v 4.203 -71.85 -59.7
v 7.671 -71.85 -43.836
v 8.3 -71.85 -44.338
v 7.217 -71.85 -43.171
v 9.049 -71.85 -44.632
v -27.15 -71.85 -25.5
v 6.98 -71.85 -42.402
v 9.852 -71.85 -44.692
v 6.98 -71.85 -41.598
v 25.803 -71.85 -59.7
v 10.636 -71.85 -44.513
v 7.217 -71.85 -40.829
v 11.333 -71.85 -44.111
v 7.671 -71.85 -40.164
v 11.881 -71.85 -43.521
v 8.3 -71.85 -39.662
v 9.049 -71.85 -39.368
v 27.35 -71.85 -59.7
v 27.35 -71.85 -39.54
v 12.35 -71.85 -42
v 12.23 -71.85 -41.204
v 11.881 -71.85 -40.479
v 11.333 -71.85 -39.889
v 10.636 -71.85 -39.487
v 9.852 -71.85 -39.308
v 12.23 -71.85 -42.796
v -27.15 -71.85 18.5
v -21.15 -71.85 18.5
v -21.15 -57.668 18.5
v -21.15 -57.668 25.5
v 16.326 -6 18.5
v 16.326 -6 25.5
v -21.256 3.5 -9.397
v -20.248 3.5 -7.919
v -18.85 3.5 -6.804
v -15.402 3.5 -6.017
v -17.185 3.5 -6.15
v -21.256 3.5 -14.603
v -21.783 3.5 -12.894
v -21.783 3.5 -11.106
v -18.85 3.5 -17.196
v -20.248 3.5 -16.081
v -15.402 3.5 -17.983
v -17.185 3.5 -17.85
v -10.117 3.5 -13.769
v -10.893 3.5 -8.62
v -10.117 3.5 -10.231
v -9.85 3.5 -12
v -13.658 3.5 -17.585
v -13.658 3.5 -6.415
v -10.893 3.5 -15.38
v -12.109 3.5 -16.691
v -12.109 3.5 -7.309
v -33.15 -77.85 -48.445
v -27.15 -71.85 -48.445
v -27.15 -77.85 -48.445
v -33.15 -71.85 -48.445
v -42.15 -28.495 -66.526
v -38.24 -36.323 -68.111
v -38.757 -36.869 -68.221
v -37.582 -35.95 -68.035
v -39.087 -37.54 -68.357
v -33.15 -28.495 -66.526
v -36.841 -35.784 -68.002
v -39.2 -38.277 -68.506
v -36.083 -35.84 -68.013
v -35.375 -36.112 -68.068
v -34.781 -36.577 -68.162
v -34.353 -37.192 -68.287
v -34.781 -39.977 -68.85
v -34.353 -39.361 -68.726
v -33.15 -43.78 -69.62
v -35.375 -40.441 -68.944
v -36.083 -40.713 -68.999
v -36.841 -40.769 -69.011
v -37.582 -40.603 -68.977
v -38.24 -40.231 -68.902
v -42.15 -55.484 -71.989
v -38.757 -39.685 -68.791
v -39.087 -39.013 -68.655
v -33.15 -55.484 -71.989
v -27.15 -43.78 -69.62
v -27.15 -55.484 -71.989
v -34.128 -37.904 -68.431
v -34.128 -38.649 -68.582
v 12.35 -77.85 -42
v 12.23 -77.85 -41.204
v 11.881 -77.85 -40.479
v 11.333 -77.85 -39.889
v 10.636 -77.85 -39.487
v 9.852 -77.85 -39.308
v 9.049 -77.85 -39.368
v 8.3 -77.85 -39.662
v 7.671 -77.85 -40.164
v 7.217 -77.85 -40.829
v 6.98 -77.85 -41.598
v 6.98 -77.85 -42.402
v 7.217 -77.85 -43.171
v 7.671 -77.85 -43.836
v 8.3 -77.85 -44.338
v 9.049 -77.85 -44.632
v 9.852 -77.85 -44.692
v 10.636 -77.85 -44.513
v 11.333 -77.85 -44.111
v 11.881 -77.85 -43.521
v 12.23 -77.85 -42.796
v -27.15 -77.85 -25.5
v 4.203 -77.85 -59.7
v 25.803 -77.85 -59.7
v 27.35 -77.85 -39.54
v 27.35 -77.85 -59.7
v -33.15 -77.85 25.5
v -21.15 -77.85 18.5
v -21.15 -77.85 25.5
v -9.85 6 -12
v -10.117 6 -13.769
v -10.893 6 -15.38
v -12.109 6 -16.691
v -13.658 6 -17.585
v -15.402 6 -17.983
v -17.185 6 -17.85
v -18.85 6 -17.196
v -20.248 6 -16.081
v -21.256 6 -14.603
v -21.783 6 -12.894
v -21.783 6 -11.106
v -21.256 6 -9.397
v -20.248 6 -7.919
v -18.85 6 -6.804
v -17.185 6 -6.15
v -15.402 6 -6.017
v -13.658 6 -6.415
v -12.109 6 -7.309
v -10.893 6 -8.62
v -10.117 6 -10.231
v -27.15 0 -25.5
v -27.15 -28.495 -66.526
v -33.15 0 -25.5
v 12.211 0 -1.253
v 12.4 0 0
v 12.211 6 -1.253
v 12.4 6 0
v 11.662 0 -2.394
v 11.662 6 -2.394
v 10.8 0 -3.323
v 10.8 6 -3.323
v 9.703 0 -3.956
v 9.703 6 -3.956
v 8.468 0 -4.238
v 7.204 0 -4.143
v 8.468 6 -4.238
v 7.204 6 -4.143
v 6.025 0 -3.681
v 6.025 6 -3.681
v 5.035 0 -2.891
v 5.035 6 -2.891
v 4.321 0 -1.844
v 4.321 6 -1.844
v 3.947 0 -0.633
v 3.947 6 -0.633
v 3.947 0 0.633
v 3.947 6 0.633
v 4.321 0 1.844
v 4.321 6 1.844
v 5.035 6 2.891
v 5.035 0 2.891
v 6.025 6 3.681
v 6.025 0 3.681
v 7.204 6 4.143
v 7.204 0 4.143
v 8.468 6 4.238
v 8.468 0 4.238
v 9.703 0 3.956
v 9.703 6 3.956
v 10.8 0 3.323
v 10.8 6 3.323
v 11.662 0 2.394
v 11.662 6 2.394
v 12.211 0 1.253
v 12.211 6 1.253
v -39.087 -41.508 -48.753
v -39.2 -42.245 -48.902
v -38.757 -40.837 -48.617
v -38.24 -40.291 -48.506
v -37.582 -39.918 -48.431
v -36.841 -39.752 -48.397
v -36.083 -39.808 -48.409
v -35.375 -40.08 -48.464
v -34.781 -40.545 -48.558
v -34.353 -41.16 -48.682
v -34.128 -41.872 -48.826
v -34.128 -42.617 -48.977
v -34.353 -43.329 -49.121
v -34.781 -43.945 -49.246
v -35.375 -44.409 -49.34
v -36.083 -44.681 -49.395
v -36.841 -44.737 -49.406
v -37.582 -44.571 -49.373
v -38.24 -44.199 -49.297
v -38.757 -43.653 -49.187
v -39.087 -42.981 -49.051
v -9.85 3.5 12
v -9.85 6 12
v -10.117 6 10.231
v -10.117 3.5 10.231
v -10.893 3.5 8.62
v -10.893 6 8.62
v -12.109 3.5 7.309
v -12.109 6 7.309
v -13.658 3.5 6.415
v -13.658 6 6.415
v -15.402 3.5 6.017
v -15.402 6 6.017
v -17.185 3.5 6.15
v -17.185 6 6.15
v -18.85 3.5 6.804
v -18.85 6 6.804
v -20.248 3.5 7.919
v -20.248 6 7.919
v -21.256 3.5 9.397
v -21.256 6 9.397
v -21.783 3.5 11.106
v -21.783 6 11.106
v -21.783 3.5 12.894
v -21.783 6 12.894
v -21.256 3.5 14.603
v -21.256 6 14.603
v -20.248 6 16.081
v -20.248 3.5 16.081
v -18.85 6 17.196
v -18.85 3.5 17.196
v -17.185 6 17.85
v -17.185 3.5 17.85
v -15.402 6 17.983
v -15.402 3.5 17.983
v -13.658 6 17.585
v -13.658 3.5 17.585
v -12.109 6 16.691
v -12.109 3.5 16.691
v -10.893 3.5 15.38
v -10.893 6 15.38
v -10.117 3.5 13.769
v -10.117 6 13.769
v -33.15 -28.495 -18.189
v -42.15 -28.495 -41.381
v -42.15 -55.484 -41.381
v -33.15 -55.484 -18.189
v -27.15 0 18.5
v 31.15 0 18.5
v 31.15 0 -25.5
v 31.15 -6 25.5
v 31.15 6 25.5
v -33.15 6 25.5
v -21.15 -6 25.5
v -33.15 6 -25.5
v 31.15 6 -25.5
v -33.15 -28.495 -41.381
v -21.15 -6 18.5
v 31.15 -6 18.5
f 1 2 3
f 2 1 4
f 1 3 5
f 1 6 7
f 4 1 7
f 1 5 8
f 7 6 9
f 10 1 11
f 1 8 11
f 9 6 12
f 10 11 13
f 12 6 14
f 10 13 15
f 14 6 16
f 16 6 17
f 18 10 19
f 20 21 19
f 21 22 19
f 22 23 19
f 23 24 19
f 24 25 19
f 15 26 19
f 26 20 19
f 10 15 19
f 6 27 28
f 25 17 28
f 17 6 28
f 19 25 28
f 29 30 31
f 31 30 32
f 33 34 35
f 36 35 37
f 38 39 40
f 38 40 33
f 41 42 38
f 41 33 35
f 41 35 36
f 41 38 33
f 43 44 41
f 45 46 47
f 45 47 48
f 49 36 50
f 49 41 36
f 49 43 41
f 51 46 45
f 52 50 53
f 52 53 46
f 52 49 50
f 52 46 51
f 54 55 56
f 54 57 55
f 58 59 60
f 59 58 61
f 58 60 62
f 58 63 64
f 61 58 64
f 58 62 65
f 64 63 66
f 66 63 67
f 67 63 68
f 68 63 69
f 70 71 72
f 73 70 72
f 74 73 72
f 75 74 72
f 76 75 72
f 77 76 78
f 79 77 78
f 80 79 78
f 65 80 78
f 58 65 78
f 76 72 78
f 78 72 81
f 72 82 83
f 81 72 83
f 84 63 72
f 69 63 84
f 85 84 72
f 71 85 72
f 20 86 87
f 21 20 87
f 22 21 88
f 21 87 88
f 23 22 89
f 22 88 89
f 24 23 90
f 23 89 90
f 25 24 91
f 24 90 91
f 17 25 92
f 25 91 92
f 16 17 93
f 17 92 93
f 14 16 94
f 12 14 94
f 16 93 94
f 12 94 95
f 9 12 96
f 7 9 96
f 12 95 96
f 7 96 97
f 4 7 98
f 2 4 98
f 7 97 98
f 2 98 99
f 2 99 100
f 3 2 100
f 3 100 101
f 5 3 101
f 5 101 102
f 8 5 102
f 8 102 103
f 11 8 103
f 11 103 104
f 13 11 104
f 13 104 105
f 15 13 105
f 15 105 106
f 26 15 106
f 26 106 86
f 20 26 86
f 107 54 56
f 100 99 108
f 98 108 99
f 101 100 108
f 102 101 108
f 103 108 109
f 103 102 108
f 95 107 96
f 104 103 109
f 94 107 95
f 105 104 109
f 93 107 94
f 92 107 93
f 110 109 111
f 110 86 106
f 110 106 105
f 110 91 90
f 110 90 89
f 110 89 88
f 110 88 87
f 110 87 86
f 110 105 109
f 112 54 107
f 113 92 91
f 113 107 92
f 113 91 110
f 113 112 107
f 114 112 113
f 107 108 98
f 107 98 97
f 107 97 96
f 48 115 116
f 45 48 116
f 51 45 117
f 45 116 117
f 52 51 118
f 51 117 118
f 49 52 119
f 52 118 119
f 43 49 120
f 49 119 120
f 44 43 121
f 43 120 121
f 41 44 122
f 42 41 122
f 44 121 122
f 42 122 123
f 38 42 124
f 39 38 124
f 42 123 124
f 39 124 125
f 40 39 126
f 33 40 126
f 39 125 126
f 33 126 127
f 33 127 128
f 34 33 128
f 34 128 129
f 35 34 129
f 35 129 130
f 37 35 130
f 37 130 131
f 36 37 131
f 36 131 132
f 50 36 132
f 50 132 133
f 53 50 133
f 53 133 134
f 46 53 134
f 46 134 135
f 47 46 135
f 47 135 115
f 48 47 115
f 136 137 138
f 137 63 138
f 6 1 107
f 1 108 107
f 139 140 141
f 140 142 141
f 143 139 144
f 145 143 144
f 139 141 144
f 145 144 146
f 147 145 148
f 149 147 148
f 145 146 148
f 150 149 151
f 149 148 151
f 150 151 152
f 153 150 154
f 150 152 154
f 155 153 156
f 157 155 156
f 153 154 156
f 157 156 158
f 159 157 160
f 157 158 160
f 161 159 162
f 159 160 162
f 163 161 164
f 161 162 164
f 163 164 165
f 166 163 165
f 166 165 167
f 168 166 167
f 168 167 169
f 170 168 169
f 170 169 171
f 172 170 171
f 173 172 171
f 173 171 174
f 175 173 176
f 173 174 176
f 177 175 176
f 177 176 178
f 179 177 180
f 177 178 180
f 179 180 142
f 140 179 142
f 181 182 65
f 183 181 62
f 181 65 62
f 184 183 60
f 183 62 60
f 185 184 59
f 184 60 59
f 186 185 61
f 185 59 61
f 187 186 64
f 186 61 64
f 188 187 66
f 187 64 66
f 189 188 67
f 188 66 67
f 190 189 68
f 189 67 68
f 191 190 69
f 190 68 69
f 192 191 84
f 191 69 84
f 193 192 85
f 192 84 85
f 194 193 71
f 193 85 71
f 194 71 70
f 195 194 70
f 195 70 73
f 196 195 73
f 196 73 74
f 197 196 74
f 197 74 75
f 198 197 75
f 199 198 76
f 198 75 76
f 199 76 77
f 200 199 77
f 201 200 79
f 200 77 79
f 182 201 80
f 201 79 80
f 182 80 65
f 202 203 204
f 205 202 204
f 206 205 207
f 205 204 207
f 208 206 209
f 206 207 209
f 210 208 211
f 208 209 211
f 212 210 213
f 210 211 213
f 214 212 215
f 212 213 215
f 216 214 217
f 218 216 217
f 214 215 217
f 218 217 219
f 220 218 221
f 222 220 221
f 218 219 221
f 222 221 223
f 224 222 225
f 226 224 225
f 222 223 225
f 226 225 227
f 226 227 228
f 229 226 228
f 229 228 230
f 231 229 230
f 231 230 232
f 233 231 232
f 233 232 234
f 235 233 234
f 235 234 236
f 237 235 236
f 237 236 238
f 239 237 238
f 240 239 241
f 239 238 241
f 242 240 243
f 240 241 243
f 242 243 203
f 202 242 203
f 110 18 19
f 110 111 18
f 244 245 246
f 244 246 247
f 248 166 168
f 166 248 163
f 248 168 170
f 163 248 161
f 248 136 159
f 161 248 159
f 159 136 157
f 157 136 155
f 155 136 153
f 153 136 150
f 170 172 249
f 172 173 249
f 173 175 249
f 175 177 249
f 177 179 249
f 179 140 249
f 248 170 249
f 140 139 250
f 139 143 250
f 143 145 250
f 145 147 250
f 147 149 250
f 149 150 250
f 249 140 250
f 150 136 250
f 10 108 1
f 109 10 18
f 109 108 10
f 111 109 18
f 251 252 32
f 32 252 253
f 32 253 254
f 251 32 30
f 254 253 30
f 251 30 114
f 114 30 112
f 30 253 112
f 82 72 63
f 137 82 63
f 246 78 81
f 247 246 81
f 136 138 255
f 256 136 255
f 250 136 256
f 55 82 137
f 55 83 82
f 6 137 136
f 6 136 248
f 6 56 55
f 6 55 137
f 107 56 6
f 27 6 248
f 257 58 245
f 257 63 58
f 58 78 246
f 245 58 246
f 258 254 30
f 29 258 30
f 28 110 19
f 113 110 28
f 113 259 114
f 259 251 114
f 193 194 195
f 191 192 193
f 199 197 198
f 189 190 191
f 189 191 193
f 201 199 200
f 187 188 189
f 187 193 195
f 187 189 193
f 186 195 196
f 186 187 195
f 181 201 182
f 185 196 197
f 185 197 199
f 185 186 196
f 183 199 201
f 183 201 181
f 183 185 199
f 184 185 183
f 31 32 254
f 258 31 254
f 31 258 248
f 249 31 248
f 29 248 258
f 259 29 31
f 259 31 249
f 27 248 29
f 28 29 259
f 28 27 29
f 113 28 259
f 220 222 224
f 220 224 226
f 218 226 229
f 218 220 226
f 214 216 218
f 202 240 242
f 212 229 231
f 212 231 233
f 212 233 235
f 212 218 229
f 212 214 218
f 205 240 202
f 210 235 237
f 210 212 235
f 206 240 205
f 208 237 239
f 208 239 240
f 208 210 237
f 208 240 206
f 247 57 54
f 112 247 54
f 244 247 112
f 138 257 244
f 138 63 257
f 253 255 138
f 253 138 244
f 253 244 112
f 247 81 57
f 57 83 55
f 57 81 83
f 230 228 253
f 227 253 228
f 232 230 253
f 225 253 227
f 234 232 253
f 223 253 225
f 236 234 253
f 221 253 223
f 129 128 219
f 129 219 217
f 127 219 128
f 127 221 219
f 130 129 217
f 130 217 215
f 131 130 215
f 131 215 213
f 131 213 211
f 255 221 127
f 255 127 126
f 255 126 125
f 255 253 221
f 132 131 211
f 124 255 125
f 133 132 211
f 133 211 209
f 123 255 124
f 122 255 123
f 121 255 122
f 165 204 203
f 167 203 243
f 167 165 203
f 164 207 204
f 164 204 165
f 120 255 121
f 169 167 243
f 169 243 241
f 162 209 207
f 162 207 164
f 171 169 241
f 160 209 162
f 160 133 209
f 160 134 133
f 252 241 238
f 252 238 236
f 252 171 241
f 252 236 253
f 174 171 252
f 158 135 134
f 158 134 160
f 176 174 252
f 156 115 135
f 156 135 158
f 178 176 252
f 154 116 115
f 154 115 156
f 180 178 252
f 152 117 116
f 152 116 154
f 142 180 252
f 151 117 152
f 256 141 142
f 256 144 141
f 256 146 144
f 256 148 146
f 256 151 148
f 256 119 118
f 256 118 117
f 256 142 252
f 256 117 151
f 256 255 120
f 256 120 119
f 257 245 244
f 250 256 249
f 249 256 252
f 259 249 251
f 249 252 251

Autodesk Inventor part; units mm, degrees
ref_plane "YZ Plane" through (0, 0, 0) normal (1, 0, 0) x (0, 1, 0)
ref_plane "XZ Plane" through (0, 0, 0) normal (0, 1, 0) x (-1, 0, 0)
ref_plane "XY Plane" through (0, 0, 0) normal (0, 0, 1) x (1, 0, 0)
sketch "Sketch1" plane through (0, 0, 0) normal (0, 1, 0) x (-1, 0, 0)
  line L0 (0, -25.5) -> (-34.15, -25.5)
  line L1 (-34.15, -25.5) -> (-34.15, 0)
  line L2 (-34.15, 0) -> (-34.15, 25.5)
  line L3 (-34.15, 25.5) -> (0, 25.5)
  line L4 (0, 25.5) -> (34.15, 25.5)
  line L5 (34.15, 25.5) -> (34.15, 0)
  line L6 (34.15, 0) -> (34.15, -25.5)
  line L7 (34.15, -25.5) -> (0, -25.5)
  point P0 (0, 0)
extrude "Extrusion1" add sketch "Sketch1" along normal blind 7
sketch "Sketch3" plane through (-34.15, 0, 25.5) normal (0, 0, 1) x (1, 0, 0)
  line L0 (0, 0) -> (0, -78.85)
  point P0 (34.15, 0)
  dimension "d7" = 78.85
sketch "Sketch4" plane through (-34.15, 0, -25.5) normal (-1, 0, 0) x (0, 0, 1)
  line L0 (51, 0) -> (51, -78.85)
  line L1 (51, -78.85) -> (-39, -78.85)
  line L2 (-39, -78.85) -> (-39, -71.85)
  line L3 (0, 0) -> (-39, -71.85)
  line L4 (0, 0) -> (51, 0)
  point P0 (25.5, 0)
  dimension "d10" = 90
  dimension "d11" = 7
extrude "Extrusion2" add sketch "Sketch4" against normal blind 7
sketch "Sketch6" plane through (0, 7, 0) normal (0, 1, 0) x (1, 0, 0)
  line L0 (34.15, -25.5) -> (34.15, 25.5) projected
  line L1 (34.15, 25.5) -> (34.15, 0)
  line L2 (-34.15, 25.5) -> (-34.15, -25.5) projected
  circle A0 centre (8.15, 0) radius 5
  point P0 (0, 0)
  dimension "d20" = 10
extrude "Extrusion4" cut sketch "Sketch6" against normal blind 10
sketch "Sketch7" plane through (-27.15, 0, -25.5) normal (1, 0, 0) x (0, 0, -1)
  line L0 (-51, -78.85) -> (39, -78.85) projected
  line L1 (-51, -78.85) -> (39, -78.85)
  line L2 (39, -78.85) -> (39, -71.85) projected
  line L3 (39, -78.85) -> (39, -71.85)
  line L4 (39, -71.85) -> (-51, -71.85)
  line L5 (-51, 0) -> (-51, -78.85) projected
  line L6 (-51, -78.85) -> (-51, -71.85)
  point P0 (-25.5, 0)
sketch "Sketch8" plane through (0, 0, 0) normal (0, -1, 0) x (1, 0, 0)
  circle A0 centre (8.15, 0) radius 5 projected
  line L0 (8.15, 18.5) -> (34.15, 18.5)
  line L1 (34.15, 25.5) -> (34.15, -25.5) projected
  line L2 (8.15, 25.5) -> (34.15, 25.5)
  line L3 (8.15, 25.5) -> (-27.15, 25.5)
  line L4 (-27.15, 25.5) -> (-27.15, -25.5) projected
  line L5 (8.15, 18.5) -> (-27.15, 18.5)
  line L6 (34.15, 25.5) -> (34.15, 18.5)
  line L7 (-27.15, 25.5) -> (-27.15, 18.5)
  point P0 (0, 0)
extrude "Extrusion6" add sketch "Sketch7" along normal blind 58.5
extrude "Extrusion7" add sketch "Sketch8" along normal blind 78.75 contours L5 L4 L3 L2 L1 L0
sketch "Sketch9" plane through (31.35, 0, -25.5) normal (1, 0, 0) x (0, 0, -1)
  line L0 (-51, -78.75) -> (-51, 7) projected
  line L1 (-44, 0) -> (-44, -71.85) projected
  line L2 (-51, -78.75) -> (-44, -78.75)
  line L3 (-44, -78.75) -> (-44, -71.85)
  line L4 (-44, -71.85) -> (-51, -71.85)
  line L5 (-51, -71.85) -> (-51, -78.75)
  point P0 (-25.5, 0)
extrude "Extrusion8" cut sketch "Sketch9" along normal blind 10
sketch "Sketch10" plane through (0, 7, 0) normal (0, 1, 0) x (1, 0, 0)
  point P0 (0, 0)
sketch "Boceto11" plane through (-34.15, -78.85, -64.5) normal (0, -1, 0) x (1, 0, 0)
  line L0 (72.0718, 89.9914) -> (72.0718, 37.9883)
  line L1 (72.0718, 37.9883) -> (65.5278, 37.9883)
  line L2 (65.5278, 37.9883) -> (65.5278, 89.9914)
  line L3 (72.0718, 89.9914) -> (72.0718, 92.1751)
  line L4 (72.0718, 92.1751) -> (65.5278, 92.1751)
  line L5 (65.5278, 92.1751) -> (65.5278, 89.9914)
  point P0 (34.15, 64.5)
extrude "Extrusión9" cut sketch "Boceto11" against normal blind 1000
sketch "Boceto18" plane through (-34.15, -78.85, 25.5) normal (0, 0, 1) x (1, 0, 0)
  point P0 (34.15, 78.85)
sketch "Boceto23" plane through (-27.15, 0, -25.5) normal (0, 0.4770514, -0.8788754) x (-1, 0, 0)
  point P0 (-27.15, 12.1648)
sketch "Boceto24" plane through (-27.15, 0, -25.5) normal (0, 0, -1) x (-1, 0, 0)
  line L0 (7, -71.85) -> (7, -78.85) projected
  line L1 (7, -78.35) -> (7, -78.85)
  line L2 (7, -78.85) -> (-58.5, -78.85) projected
  line L3 (-58.5, -78.85) -> (-58.5, -77.85)
  line L4 (-58.5, -71.85) -> (-58.5, -78.85) projected
  line L5 (-58.5, -77.85) -> (6, -77.85)
  line L6 (7, -77.85) -> (7, -78.85)
  line L7 (7, -78.85) -> (-58.8392, -78.85)
  line L8 (-58.5278, 7) -> (7, 7) projected
  line L9 (7, -78.85) -> (7, 7)
  line L10 (7, 7) -> (6, 7)
  line L11 (6, 6) -> (6, -77.85)
  line L12 (-58.5278, -71.85) -> (-58.5278, 7) projected
  line L13 (-58.5278, 7) -> (-58.5278, 6)
  line L14 (-58.5278, 6) -> (6, 6)
  line L15 (7, 0) -> (7, 7) projected
  line L16 (7, 6) -> (7, 7)
  line L17 (7, 7) -> (-58.5278, 7)
  point P0 (-27.15, 0)
  dimension "d65" = 1
  dimension "d66" = 1
  dimension "d67" = 1
extrude "Extrusión19" cut sketch "Boceto24" along normal mid plane 1000
sketch "Boceto25" plane through (31.35, -71.85, -64.5) normal (0, 0, -1) x (-1, 0, 0)
  point P0 (31.35, 71.85)
sketch "Boceto27" plane through (31.3778, 0, -25.5) normal (0, 0, -1) x (-1, 0, 0)
  line L0 (0, -71.85) -> (0, 6) projected
  line L1 (0, 6) -> (0.228, 6)
  line L2 (0, 6) -> (64.5278, 6) projected
  line L3 (0.228, 6) -> (0.228, -77.85)
  line L4 (0.0278, -77.85) -> (64.5278, -77.85) projected
  line L5 (0.0278, -71.85) -> (0.0278, -77.85) projected
  line L6 (0.228, -77.85) -> (0.0278, -77.85)
  line L7 (0.0278, -77.85) -> (0, 6)
  line L8 (0, 6) -> (0, -77.85)
  line L9 (0, -77.85) -> (0.0278, -77.85)
  point P0 (31.3778, 0)
  dimension "d73" = 0.228
extrude "Extrusión21" cut sketch "Boceto27" along normal mid plane 1000
sketch "Boceto28" plane through (-33.15, 0, -25.5) normal (-1, 0, 0) x (0, 0, 1)
  point P0 (25.5, 0)
sketch "Boceto30" plane through (-33.15, 0, -25.5) normal (-1, 0, 0) x (0, 0, 1)
  point P0 (25.5, 0)
sketch "Boceto31" plane through (-33.15, 0, -25.5) normal (-1, 0, 0) x (0, 0, 1)
  circle A0 centre (64.38, -38.5153) radius 2.6
  point P0 (25.5, 0)
  point P1 (64.38, -49.4573)
sketch "Boceto32" plane through (-27.15, -71.85, 18.5) normal (0, 1, 0) x (1, 0, 0)
  circle A0 centre (47, 71.5) radius 5 projected
  circle A1 centre (47, 71.5) radius 5
  line L0 (52, 71.5) -> (58.2998, 71.5)
  line L1 (67, 83) -> (67, -7)
  line L2 (58.2998, -7) -> (-6, -7) projected
  line L3 (67, -7) -> (58.2998, -7)
  line L4 (58.2998, -7) -> (58.2998, 83)
  line L5 (47, 76.5) -> (47, 83)
  line L6 (-6, 83) -> (0, 83) projected
  line L7 (-6, 83) -> (-6, 91.5)
  line L8 (-6, 91.5) -> (67, 91.5)
  line L9 (67, 91.5) -> (67, 83)
  line L10 (-6, 83) -> (58.2998, 83)
  point P0 (27.15, 18.5)
extrude "Extrusión23" add sketch "Boceto32" against normal blind 6 contours L4 L10 L6 L7 L8 L9 L1 L3
sketch "Boceto33" plane through (-33.15, -77.85, 25.5) normal (-1, 0, 0) x (0, 0, 1)
  line L0 (0, 83.85) -> (0, 0) projected
  line L1 (0, 74.4354) -> (10.1255, 74.4354)
  line L2 (10.1255, 74.4354) -> (10.1255, 56.6115)
  line L3 (10.9445, 54.9975) -> (18.0243, 49.8171)
  line L4 (18.8039, 48.5979) -> (20.1084, 42.1205)
  line L5 (0, 11.6181) -> (18.1478, 11.6181)
  line L6 (20.1478, 13.6181) -> (20.1478, 41.7256)
  arc A0 (10.1255, 56.6115) -> (10.9445, 54.9975) centre (12.1255, 56.6115) ccw
  arc A1 (18.8039, 48.5979) -> (18.0243, 49.8171) centre (16.8433, 48.203) ccw
  arc A2 (20.1478, 41.7256) -> (20.1084, 42.1205) centre (18.1478, 41.7256) ccw
  arc A3 (18.1478, 11.6181) -> (20.1478, 13.6181) centre (18.1478, 13.6181) ccw
  point P0 (-25.5, 77.85)
  dimension "d91" = 2
extrude "Extrusión24" add sketch "Boceto33" against normal blind 6
extrude "Extrusión25" cut sketch "Boceto31" against normal blind 6
sketch "Boceto34" plane through (-27.15, -77.85, 25.5) normal (1, 0, 0) x (0, 0, -1)
  line L0 (-18.1478, 11.6181) -> (-21.8775, 11.6181)
  line L1 (-21.8775, 11.6181) -> (-21.8775, 48.067)
  line L2 (-21.8775, 48.067) -> (-10.1255, 56.8358)
  line L3 (-10.1255, 74.4354) -> (-10.1255, 56.6115) projected
  line L4 (-10.1255, 56.8358) -> (-10.1255, 48.9642)
  line L5 (-10.1255, 48.9642) -> (-16.6729, 42.1735)
  line L6 (-16.6729, 42.1735) -> (-18.1478, 11.6181)
  point P0 (25.5, 77.85)
extrude "Extrusión26" add sketch "Boceto34" against normal blind 6
fillet "Empalme5" radius 10 3 edges at (-30.15, -21.0142, 35.6255) (-30.15, -29.783, 47.3775) (-30.15, -66.2319, 47.3775)
sketch "Boceto37" plane through (-33.15, 6, 25.5) normal (0, 1, 0) x (1, 0, 0)
  circle A0 centre (41.3, 25.5) radius 6 projected
  line L0 (41.3, 25.5) -> (17.3, 25.5)
  line L1 (17.3, 25.5) -> (17.3, 13.5)
  line L2 (17.3, 13.5) -> (17.3, 37.5)
  circle A1 centre (17.3, 13.5) radius 6
  circle A2 centre (17.3, 37.5) radius 6
  point P0 (33.15, 25.5)
  dimension "d106" = 24
  dimension "d107" = 12
  dimension "d108" = 24
  dimension "d109" = 12
  dimension "d110" = 12
extrude "Extrusión29" cut sketch "Boceto37" against normal blind 2.5 contours A1 | A2
sketch "Boceto39" plane through (-27.15, -71.85, 18.5) normal (0, 1, 0) x (1, 0, 0)
  line L0 (58.2998, -7) -> (58.2998, 0)
  line L1 (58.2998, 44) -> (58.2998, 91.5)
  line L2 (-6, 91.5) -> (67, 91.5) projected
  line L3 (0, 0) -> (58.2998, 0) projected
  line L4 (58.2998, 0) -> (58.2998, -7) projected
  line L5 (58.2998, -7) -> (67, -7) projected
  line L6 (58.2998, -7) -> (67, -7)
  line L7 (67, 91.5) -> (-6, 91.5) projected
  line L8 (67, -7) -> (67, 91.5)
  line L9 (67, 91.5) -> (58.2998, 91.5)
  line L10 (58.2998, 0) -> (58.2998, 44)
  point P0 (27.15, 18.5)
extrude "Extrusión31" cut sketch "Boceto39" against normal blind 10
sketch "Boceto41" plane through (-27.15, -71.85, 18.5) normal (0, 1, 0) x (1, 0, 0)
  line L0 (58.2998, 91.5) -> (58.2998, -7) projected
  line L1 (58.2998, 91.5) -> (31.7998, 91.5)
  line L2 (31.7998, 91.5) -> (31.7998, 65)
  line L3 (31.7998, 65) -> (58.2998, 65)
  line L4 (58.2998, 65) -> (58.2998, 91.5)
  circle A0 centre (31.7998, 65) radius 6
  point P0 (27.15, 18.5)
  dimension "d124" = 26.5
  dimension "d125" = 26.5
  dimension "d126" = 12
extrude "Extrusión32" cut sketch "Boceto41" against normal blind 10 contours A0 L2 L3 | L3 L2 A0
sketch "Sketch42" plane through (-27.15, -71.85, 18.5) normal (0, 1, 0) x (1, 0, 0)
  circle A0 centre (31.7998, 65) radius 6 projected
  line L0 (31.7998, 71) -> (31.7998, 65)
  circle A1 centre (31.7998, 65) radius 18
  line L1 (0, 0) -> (0, 83) projected
  line L2 (0, 83) -> (31.7998, 83)
  line L3 (58.2998, 91.5) -> (-6, 91.5) projected
  line L4 (49.7998, 65) -> (49.7998, 0)
  line L5 (58.2998, 0) -> (0, 0) projected
  line L6 (0, 0) -> (58.2998, 0) projected
  line L7 (49.7998, 0) -> (58.2998, 0)
  line L8 (58.2998, 91.5) -> (58.2998, -7) projected
  line L9 (58.2998, 0) -> (58.2998, 91.5)
  line L10 (0, 83) -> (0, 44) projected
  line L11 (0, 83) -> (-6, 83)
  line L12 (-6, 91.5) -> (-6, 83) projected
  line L13 (-6, 83) -> (-6, 91.5)
  line L14 (58.2998, 91.5) -> (58.2998, 0) projected
  line L15 (-6, 91.5) -> (58.2998, 91.5)
  point P0 (27.15, 18.5)
  point P1 (58.2998, -7)
  dimension "d129" = 36
extrude "Extrusion33" cut sketch "Sketch42" against normal blind 10 contours A1 L2 L11 L12 L3 L8 L5 L4
sketch "Sketch43" plane through (-27.15, -71.85, 18.5) normal (0, 0, -1) x (-1, 0, 0)
  line L0 (6, -6) -> (-58.2998, -6) projected
  line L1 (0, 0) -> (-49.7998, 0) projected
  line L2 (-58.2998, -6) -> (-49.7998, -6)
  line L3 (-49.7998, -6) -> (-49.7998, 0)
  line L4 (-49.7998, 0) -> (-58.2998, 0)
  line L5 (-58.2998, 0) -> (-58.2998, -6)
  point P0 (-27.15, 71.85)
extrude "Extrusion34" add sketch "Sketch43" along normal blind 20
fillet "Fillet7" radius 7 1 edges at (31.1498, -74.85, -1.5)
fillet "Fillet8" radius 2 1 edges at (22.6498, -74.85, -1.5)
sketch "Sketch44" plane through (-33.15, 0, -25.5) normal (-1, 0, 0) x (0, 0, 1)
  line L0 (68.8577, -26.7837) -> (65.1452, -24.0136) projected
  line L1 (61.1255, -3.4146) -> (51, -3.4146) projected
  line L2 (65.1452, -24.0136) -> (51, -24.0136)
  line L3 (51, -24.0136) -> (51, -3.4146)
  line L4 (51, -3.4146) -> (65.1452, -3.4146)
  line L5 (65.1452, -3.4146) -> (65.1452, -24.0136)
  point P0 (25.5, 0)
extrude "Extrusion35" cut sketch "Sketch44" against normal blind 20
sketch "Sketch45" plane through (-33.15, 6, 25.5) normal (0, 1, 0) x (1, 0, 0)
  circle A0 centre (41.3, 25.5) radius 5 projected
  circle A1 centre (41.3, 25.5) radius 4.25
  circle A2 centre (41.3, 25.5) radius 5
  point P0 (33.15, 25.5)
  dimension "d138" = 8.5
extrude "Extrusion36" add sketch "Sketch45" against normal blind 6
sketch "Sketch46" plane through (-33.15, 0, -25.5) normal (-1, 0, 0) x (0, 0, 1)
  point P0 (25.5, 0)
sketch "Sketch47" plane through (-33.15, 0, -25.5) normal (-1, 0, 0) x (0, 0, 1)
  line L0 (-44.1201, -43.7798) -> (-41.0263, -28.4947)
  line L1 (-39, -71.85) -> (0, 0) projected
  line L2 (-41.0263, -28.4947) -> (0, 0)
  line L3 (0, 0) -> (-39, -71.85)
  line L4 (-44.1201, -43.7798) -> (-44.1201, -71.85)
  line L5 (-44.1201, -71.85) -> (-39, -71.85)
  point P0 (25.5, 0)
extrude "Extrusion37" add sketch "Sketch47" against normal blind 6
sketch "Sketch48" plane through (-33.15, 6, -25.5) normal (-1, 0, 0) x (0, 0, 1)
  point P0 (25.5, -6)
sketch "Sketch49" plane through (-33.15, 6, -25.5) normal (-1, 0, 0) x (0, 0, 1)
  point P0 (25.5, -6)
sketch "Sketch50" plane through (-33.15, 6, -25.5) normal (-1, 0, 0) x (0, 0, 1)
  line L0 (-44.1201, -49.7798) -> (-41.0263, -34.4947) projected
  line L1 (-41.0263, -34.4947) -> (-46.4891, -61.4839)
  line L2 (-39, -83.85) -> (51, -83.85) projected
  line L3 (-39, -83.85) -> (-46.4891, -83.85)
  line L4 (-46.4891, -83.85) -> (-46.4891, -61.4839)
  line L5 (-41.0263, -34.4947) -> (-39, -69.2782)
  line L6 (-39, -69.2782) -> (-39, -83.85)
  point P0 (25.5, -6)
extrude "Extrusion38" add sketch "Sketch50" against normal blind 6
sketch "Sketch51" plane through (-33.15, 6, -25.5) normal (-1, 0, 0) x (0, 0, 1)
  line L0 (-41.0263, -34.4947) -> (-46.4891, -61.4839) projected
  line L1 (-41.0263, -34.4947) -> (-46.4891, -61.4839)
  line L2 (-46.4891, -61.4839) -> (-15.8808, -61.4839)
  line L3 (-41.0263, -34.4947) -> (-15.8808, -34.4947)
  line L4 (-15.8808, -34.4947) -> (-15.8808, -61.4839)
  point P0 (25.5, -6)
extrude "Extrusion39" add sketch "Sketch51" along normal blind 9
sketch "Sketch52" plane through (-33.15, -55.4839, -71.9891) normal (0, -1, 0) x (1, 0, 0)
  line L0 (-9, 30.6084) -> (0, 53.8004)
  line L1 (0, 0) -> (0, 97.4891) projected
  line L2 (0, 30.6084) -> (0, 53.8004)
  line L3 (0, 30.6084) -> (-9, 30.6084)
  point P0 (33.15, 71.9891)
extrude "Extrusion40" add sketch "Sketch52" against normal blind 26.989
sketch "Sketch53" plane through (-33.15, -55.4839, -18.1887) normal (-0.9322642, 0, 0.3617781) x (0.3617781, 0, 0.9322642)
  point P0 (28.9496, 55.4839)
sketch "Sketch54" plane through (-33.15, 6, -25.5) normal (-1, 0, 0) x (0, 0, 1)
  line L0 (51, -72.2319) -> (51, -83.85) projected
  line L1 (51, -83.85) -> (86.3988, -83.85)
  line L2 (86.3988, -83.85) -> (86.3988, -18.2813)
  line L3 (86.3988, -18.2813) -> (51, -18.2813)
  line L4 (51, -18.2813) -> (51, -83.85)
  point P0 (25.5, -6)
extrude "Extrusion41" cut sketch "Sketch54" against normal blind 26.989
sketch "Sketch55" plane through (-33.15, -55.4839, -71.9891) normal (0, 0.198384, -0.9801244) x (-1, 0, 0)
  line L0 (9, 6.0722) -> (9, 32.5248) projected
  line L1 (9, 17.5562) -> (3.5, 17.5562)
  line L2 (9, 17.5562) -> (14.5, 17.5562) construction
  circle A0 centre (3.5, 17.5562) radius 2.55
  point P0 (-33.15, 68.6627)
  dimension "d153" = 5.5
  dimension "d154" = 180
  dimension "d155" = 5.1
extrude "Extrusion42" cut sketch "Sketch55" against normal blind 20
sketch "Sketch56" plane through (-33.15, -77.85, 25.5) normal (0, 0, 1) x (1, 0, 0)
  line L0 (0, 77.85) -> (0, 83.85) projected
  line L1 (0, 83.85) -> (12, 83.85)
  line L2 (64.2998, 83.85) -> (0, 83.85) projected
  line L3 (12, 83.85) -> (12, 0)
  line L4 (6, 0) -> (37.7998, 0) projected
  line L5 (0, 83.85) -> (0, 0) projected
  line L6 (12, 0) -> (0, 0)
  line L7 (0, 0) -> (0, 83.85)
  line L8 (0, 83.85) -> (12, 83.85)
  line L9 (12, 83.85) -> (12, 0)
  line L10 (0, 83.85) -> (64.3, 83.85)
  line L11 (64.3, 83.85) -> (64.3, 71.85)
  line L12 (64.3, 71.85) -> (0, 71.85)
  line L13 (0, 71.85) -> (0, 83.85)
  line L14 (64.2998, 0) -> (64.2998, 83.85) projected
  line L15 (64.3, 71.85) -> (12, 0)
  line L16 (64.3, 71.85) -> (54.5981, 78.9121)
  line L17 (12, 0) -> (3.5198, 8.4904)
  line L18 (3.5198, 8.4904) -> (54.5981, 78.9121)
  line L19 (12, 0) -> (64.2998, 0)
  line L20 (64.3, 71.85) -> (64.2998, 0)
  point P0 (33.15, 77.85)
  point P1 (37.7998, 0)
  point P2 (64.2998, 71.8497)
  point P3 (12, 20.182)
  point P4 (49.4758, 71.85)
  point P5 (12, 71.85)
  dimension "d158" = 12
  dimension "d159" = 64.3
  dimension "d160" = 12
  dimension "d161" = 12
  dimension "d162" = 12
extrude "Extrusion43" cut sketch "Sketch56" against normal blind 20 contours L12 L18 L3 | L14 L19 L4 L15
sketch "Sketch57" plane through (-27.15, -77.85, -64.5) normal (0, -1, 0) x (1, 0, 0)
  point P0 (27.15, 64.5)
sketch "Sketch58" plane through (-27.15, -77.85, -64.5) normal (0, -1, 0) x (1, 0, 0)
  line L0 (0.0098, 82.9715) -> (6.0098, 82.9715)
  line L1 (0.0098, 82.9715) -> (58.6458, 82.9715)
  line L2 (58.6458, 82.9715) -> (58.6458, -19.949)
  line L3 (58.6458, -19.949) -> (0.0098, -19.949)
  line L4 (0.0098, -19.949) -> (0.0098, 82.9715)
  line L5 (58.6458, 1.7715) -> (22.1928, 1.7715)
  line L6 (22.1928, 1.7715) -> (0.0098, 16.0551)
  line L7 (0.0098, 16.0551) -> (0.0098, 82.9715)
  line L8 (58.6458, 1.7715) -> (58.6458, 39.0076)
  line L9 (58.6458, 1.7715) -> (22.1928, 1.7715)
  line L10 (58.6458, 38.2245) -> (58.6458, 1.7715)
  line L11 (58.6458, 38.2245) -> (6.0098, 82.9715)
  point P0 (15.0563, 101.6492)
extrude "Extrusion44" add sketch "Sketch58" against normal blind 6
extrude "Extrusion45" cut sketch "Sketch58" against normal blind 6
extrude "Extrusion46" add sketch "Sketch58" against normal blind 6 contours L0 L11 L2 L5 L6 L4
sketch "Sketch59" plane through (-27.15, 0, -25.5) normal (1, 0, 0) x (0, 0, -1)
  line L0 (46.4891, -77.85) -> (46.4891, -55.4839) projected
  line L1 (22.9449, -71.85) -> (22.9449, -77.85) projected
  line L2 (46.4891, -55.4839) -> (22.9449, -71.85)
  line L3 (22.9449, -71.85) -> (22.9449, -77.85)
  line L4 (22.9449, -77.85) -> (46.4891, -77.85)
  line L5 (46.4891, -55.4839) -> (46.4891, -77.85) projected
  line L6 (46.4891, -77.85) -> (46.4891, -55.4839)
  line L7 (46.4891, -55.4839) -> (46.4891, -77.85)
  point P0 (-25.5, 0)
extrude "Extrusion47" cut sketch "Sketch59" along normal blind 0.1 and the other way blind 6
sketch "Sketch60" plane through (-4.9572, -77.85, -62.7285) normal (0, -1, 0) x (1, 0, 0)
  line L0 (36.107, 88.2285) -> (-22.1928, 88.2285) projected
  line L1 (36.107, 88.2285) -> (14.607, 88.2285)
  line L2 (14.607, 88.2285) -> (14.607, 20.7285)
  line L3 (14.607, 20.7285) -> (36.107, 20.7285)
  line L4 (36.107, 20.7285) -> (36.107, 88.2285)
  circle A0 centre (14.607, 20.7285) radius 2.7
  point P0 (4.9572, 62.7285)
  dimension "d176" = 21.5
  dimension "d177" = 67.5
  dimension "d178" = 5.4
extrude "Extrusion48" cut sketch "Sketch60" against normal blind 10 contours A0 L3 L2 | L2 L3 A0
sketch "Sketch61" plane through (-33.15, -77.85, 25.5) normal (0, -1, 0) x (1, 0, 0)
  line L0 (64.6458, -51.7755) -> (64.6458, -88.2285) projected
  line L1 (64.6458, -88.2285) -> (64.6458, -70.002)
  line L2 (12, -7) -> (49.4758, -7) projected
  line L3 (64.6458, -70.002) -> (12, -7)
  line L4 (12, -7) -> (64.6458, -48.437)
  line L5 (64.6458, -48.437) -> (64.6458, -70.002)
  line L6 (64.6458, -88.2285) -> (46.4193, -88.2285)
  line L7 (6.1, -74.0029) -> (28.1928, -88.2285) projected
  line L8 (46.4193, -88.2285) -> (28.1928, -88.2285)
  line L9 (28.1928, -88.2285) -> (6.1, -61.7897)
  line L10 (6.1, -61.7897) -> (6.1, -74.0029)
  line L11 (6.1, -74.0029) -> (28.1928, -88.2285)
  point P0 (33.15, -25.5)
  dimension "d181" = 18.2265
  dimension "d182" = 18.2265
extrude "Extrusion49" cut sketch "Sketch61" against normal blind 6
sketch "Sketch62" plane through (-33.15, -28.4947, -66.5263) normal (0, 0.198384, -0.9801244) x (-1, 0, 0)
  point P0 (-33.15, 41.1261)
sketch "Sketch63" plane through (-33.15, -77.85, 25.5) normal (0, -1, 0) x (1, 0, 0)
  line L0 (6, -7) -> (6, -51) projected
  line L1 (6, -7) -> (12, -7) projected
  line L2 (12, -7) -> (64.6458, -70.002)
  circle A0 centre (42.7998, -67.5) radius 2.7 projected
  line L3 (64.6458, -70.002) -> (42.7998, -67.5)
  line L4 (42.7998, -67.5) -> (53.7228, -80.5717)
  line L5 (53.7228, -80.5717) -> (64.6458, -70.002)
  line L6 (53.7228, -80.5717) -> (42.7996, -91.1416)
  line L7 (42.7996, -91.1416) -> (6, -51)
  line L8 (42.7996, -91.1416) -> (64.6458, -91.1416)
  line L9 (64.6458, -91.1416) -> (64.6458, -70.002)
  line L10 (6, -7) -> (73.4518, -7)
  line L11 (73.4518, -7) -> (73.4518, -117.9576)
  line L12 (73.4518, -117.9576) -> (6, -117.9576)
  line L13 (6, -117.9576) -> (6, -7)
  point P0 (33.15, -25.5)
extrude "Extrusion50" cut sketch "Sketch63" against normal blind 6 contours L7 L8 L9 L2 L10 L11 L12 L13
extrude "Extrusion51" add sketch "Sketch63" against normal blind 6 contours L1 L2 L3 A0 L4 L6 L7 L0 | L6 L5 L9 L8 | L5 L4 A0 L3
sketch "Sketch64" plane through (-33.15, -77.85, 25.5) normal (0, -1, 0) x (1, 0, 0)
  circle A0 centre (42.7998, -67.5) radius 2.7 projected
  line L0 (42.7998, -67.5) -> (42.7998, -70.2)
  line L1 (42.7998, -70.2) -> (42.7998, -85.2)
  line L2 (12, -7) -> (49.4758, -7) projected
  line L3 (12, -7) -> (64.6458, -70.002) projected
  line L4 (12, -7) -> (64.6458, -70.002)
  line L5 (64.6458, -70.002) -> (64.6458, -91.1416) projected
  line L6 (64.6458, -70.002) -> (64.6458, -91.1416)
  line L7 (64.6458, -91.1416) -> (42.7998, -91.1416)
  line L8 (6, -7) -> (6, -51) projected
  line L9 (42.7998, -91.1416) -> (6, -51)
  line L10 (42.7998, -85.2) -> (64.6458, -85.2)
  line L11 (45.4998, -67.5) -> (60.4998, -67.5)
  line L12 (60.4998, -67.5) -> (60.4998, -85.2)
  line L13 (60.4998, -67.5) -> (60.4998, -65.0404)
  line L14 (42.7998, -85.2) -> (37.3528, -85.2)
  line L15 (37.3528, -85.2) -> (67.2046, -85.2)
  line L16 (67.2046, -85.2) -> (67.2046, -95.398)
  line L17 (67.2046, -95.398) -> (37.3528, -95.398)
  line L18 (37.3528, -95.398) -> (37.3528, -85.2)
  line L19 (60.4998, -85.2) -> (70.2528, -85.2)
  line L20 (70.2528, -85.2) -> (70.2528, -62.331)
  line L21 (70.2528, -62.331) -> (60.4998, -62.331)
  line L22 (60.4998, -62.331) -> (60.4998, -85.2)
  point P0 (33.15, -25.5)
  dimension "d192" = 15
  dimension "d193" = 15
extrude "Extrusion52" cut sketch "Sketch64" against normal blind 6 contours L13 L3 L5 L10 L12 | L10 L5 L7 L9 L14 | L22 L21 L20 L19 L15 L5 L3 | L9 L7 L5 L15 L16 L17 L18
sketch "Sketch65" plane through (-33.15, -77.85, 25.5) normal (0, -1, 0) x (1, 0, 0)
  line L0 (12, -7) -> (60.4998, -65.0404) projected
  line L1 (60.4998, -65.0404) -> (48.9264, -75.1202)
  line L2 (60.4998, -65.0404) -> (60.4998, -85.2) projected
  line L3 (60.4998, -65.0404) -> (60.4998, -85.2)
  line L4 (48.9264, -75.1202) -> (60.4998, -88.4085)
  line L5 (60.4998, -65.0404) -> (58.8524, -86.517)
  line L6 (58.8524, -86.517) -> (37.3528, -85.2002)
  line L7 (37.3528, -85.2002) -> (48.9264, -75.1202)
  line L8 (58.8524, -86.517) -> (69.5954, -86.517)
  line L9 (69.5954, -86.517) -> (69.5954, -59.5334)
  line L10 (69.5954, -59.5334) -> (58.8524, -59.5334)
  line L11 (58.8524, -59.5334) -> (58.8524, -86.517)
  point P0 (33.15, -25.5)
  point P1 (58.8524, -63.069)
  dimension "d196" = 15.3475
extrude "Extrusion53" cut sketch "Sketch65" against normal blind 6 contours L11 L10 L9 L8 L5 L0
extrude "Extrusion54" add sketch "Sketch65" against normal blind 6 contours L5 L11 L1 | L11 L4 L1 | L6 L7 L4
sketch "Sketch66" plane through (-33.15, -77.85, 25.5) normal (0, -1, 0) x (1, 0, 0)
  line L0 (37.3528, -85.2) -> (60.4998, -85.2)
  line L1 (60.4998, -85.2) -> (60.4998, -65.0404)
  line L2 (60.4998, -65.0404) -> (37.3528, -65.0404)
  line L3 (37.3528, -65.0404) -> (37.3528, -85.2)
  line L4 (74.8766, -52.5753) -> (26.3032, -52.5753)
  line L5 (26.3032, -52.5753) -> (26.3032, -106.4614)
  line L6 (26.3032, -106.4614) -> (74.8766, -106.4614)
  line L7 (74.8766, -106.4614) -> (74.8766, -52.5753)
  line L8 (60.4998, -52.5753) -> (60.4998, -85.2)
  line L9 (26.3032, -85.2) -> (39.2055, -85.2)
  line L10 (60.4998, -65.0404) -> (39.2055, -85.2)
  point P0 (33.15, -25.5)
extrude "Extrusion55" cut sketch "Sketch66" against normal blind 6 contours L0 L1 L8 L4 L7 L6 L5 L9
extrude "Extrusion56" add sketch "Sketch66" against normal blind 6 contours L10 L1 L0
sketch "Sketch67" plane through (-33.15, -77.85, 25.5) normal (0, -1, 0) x (1, 0, 0)
  point P0 (33.15, -25.5)
sketch "Sketch68" plane through (-33.15, -77.85, 25.5) normal (0, -1, 0) x (1, 0, 0)
  line L0 (60.4998, -65.0404) -> (60.4998, -85.2) projected
  line L1 (60.4998, -85.2) -> (37.3526, -85.2) projected
  line L2 (60.4998, -85.2) -> (37.3526, -85.2)
  line L3 (37.3526, -85.2) -> (6, -51)
  line L4 (6, -51) -> (6, -7)
  line L5 (6, -7) -> (12.2668, -7)
  line L6 (12, -7) -> (60.4998, -65.0404) projected
  line L7 (60.4998, -65.0404) -> (12, -7)
  circle A0 centre (42.7998, -67.5) radius 2.7 projected
  circle A1 centre (42.7998, -67.5) radius 2.7
  point P0 (33.15, -25.5)
properties part number "DC23[R][F][T1]" material "Aluminio 6061"
